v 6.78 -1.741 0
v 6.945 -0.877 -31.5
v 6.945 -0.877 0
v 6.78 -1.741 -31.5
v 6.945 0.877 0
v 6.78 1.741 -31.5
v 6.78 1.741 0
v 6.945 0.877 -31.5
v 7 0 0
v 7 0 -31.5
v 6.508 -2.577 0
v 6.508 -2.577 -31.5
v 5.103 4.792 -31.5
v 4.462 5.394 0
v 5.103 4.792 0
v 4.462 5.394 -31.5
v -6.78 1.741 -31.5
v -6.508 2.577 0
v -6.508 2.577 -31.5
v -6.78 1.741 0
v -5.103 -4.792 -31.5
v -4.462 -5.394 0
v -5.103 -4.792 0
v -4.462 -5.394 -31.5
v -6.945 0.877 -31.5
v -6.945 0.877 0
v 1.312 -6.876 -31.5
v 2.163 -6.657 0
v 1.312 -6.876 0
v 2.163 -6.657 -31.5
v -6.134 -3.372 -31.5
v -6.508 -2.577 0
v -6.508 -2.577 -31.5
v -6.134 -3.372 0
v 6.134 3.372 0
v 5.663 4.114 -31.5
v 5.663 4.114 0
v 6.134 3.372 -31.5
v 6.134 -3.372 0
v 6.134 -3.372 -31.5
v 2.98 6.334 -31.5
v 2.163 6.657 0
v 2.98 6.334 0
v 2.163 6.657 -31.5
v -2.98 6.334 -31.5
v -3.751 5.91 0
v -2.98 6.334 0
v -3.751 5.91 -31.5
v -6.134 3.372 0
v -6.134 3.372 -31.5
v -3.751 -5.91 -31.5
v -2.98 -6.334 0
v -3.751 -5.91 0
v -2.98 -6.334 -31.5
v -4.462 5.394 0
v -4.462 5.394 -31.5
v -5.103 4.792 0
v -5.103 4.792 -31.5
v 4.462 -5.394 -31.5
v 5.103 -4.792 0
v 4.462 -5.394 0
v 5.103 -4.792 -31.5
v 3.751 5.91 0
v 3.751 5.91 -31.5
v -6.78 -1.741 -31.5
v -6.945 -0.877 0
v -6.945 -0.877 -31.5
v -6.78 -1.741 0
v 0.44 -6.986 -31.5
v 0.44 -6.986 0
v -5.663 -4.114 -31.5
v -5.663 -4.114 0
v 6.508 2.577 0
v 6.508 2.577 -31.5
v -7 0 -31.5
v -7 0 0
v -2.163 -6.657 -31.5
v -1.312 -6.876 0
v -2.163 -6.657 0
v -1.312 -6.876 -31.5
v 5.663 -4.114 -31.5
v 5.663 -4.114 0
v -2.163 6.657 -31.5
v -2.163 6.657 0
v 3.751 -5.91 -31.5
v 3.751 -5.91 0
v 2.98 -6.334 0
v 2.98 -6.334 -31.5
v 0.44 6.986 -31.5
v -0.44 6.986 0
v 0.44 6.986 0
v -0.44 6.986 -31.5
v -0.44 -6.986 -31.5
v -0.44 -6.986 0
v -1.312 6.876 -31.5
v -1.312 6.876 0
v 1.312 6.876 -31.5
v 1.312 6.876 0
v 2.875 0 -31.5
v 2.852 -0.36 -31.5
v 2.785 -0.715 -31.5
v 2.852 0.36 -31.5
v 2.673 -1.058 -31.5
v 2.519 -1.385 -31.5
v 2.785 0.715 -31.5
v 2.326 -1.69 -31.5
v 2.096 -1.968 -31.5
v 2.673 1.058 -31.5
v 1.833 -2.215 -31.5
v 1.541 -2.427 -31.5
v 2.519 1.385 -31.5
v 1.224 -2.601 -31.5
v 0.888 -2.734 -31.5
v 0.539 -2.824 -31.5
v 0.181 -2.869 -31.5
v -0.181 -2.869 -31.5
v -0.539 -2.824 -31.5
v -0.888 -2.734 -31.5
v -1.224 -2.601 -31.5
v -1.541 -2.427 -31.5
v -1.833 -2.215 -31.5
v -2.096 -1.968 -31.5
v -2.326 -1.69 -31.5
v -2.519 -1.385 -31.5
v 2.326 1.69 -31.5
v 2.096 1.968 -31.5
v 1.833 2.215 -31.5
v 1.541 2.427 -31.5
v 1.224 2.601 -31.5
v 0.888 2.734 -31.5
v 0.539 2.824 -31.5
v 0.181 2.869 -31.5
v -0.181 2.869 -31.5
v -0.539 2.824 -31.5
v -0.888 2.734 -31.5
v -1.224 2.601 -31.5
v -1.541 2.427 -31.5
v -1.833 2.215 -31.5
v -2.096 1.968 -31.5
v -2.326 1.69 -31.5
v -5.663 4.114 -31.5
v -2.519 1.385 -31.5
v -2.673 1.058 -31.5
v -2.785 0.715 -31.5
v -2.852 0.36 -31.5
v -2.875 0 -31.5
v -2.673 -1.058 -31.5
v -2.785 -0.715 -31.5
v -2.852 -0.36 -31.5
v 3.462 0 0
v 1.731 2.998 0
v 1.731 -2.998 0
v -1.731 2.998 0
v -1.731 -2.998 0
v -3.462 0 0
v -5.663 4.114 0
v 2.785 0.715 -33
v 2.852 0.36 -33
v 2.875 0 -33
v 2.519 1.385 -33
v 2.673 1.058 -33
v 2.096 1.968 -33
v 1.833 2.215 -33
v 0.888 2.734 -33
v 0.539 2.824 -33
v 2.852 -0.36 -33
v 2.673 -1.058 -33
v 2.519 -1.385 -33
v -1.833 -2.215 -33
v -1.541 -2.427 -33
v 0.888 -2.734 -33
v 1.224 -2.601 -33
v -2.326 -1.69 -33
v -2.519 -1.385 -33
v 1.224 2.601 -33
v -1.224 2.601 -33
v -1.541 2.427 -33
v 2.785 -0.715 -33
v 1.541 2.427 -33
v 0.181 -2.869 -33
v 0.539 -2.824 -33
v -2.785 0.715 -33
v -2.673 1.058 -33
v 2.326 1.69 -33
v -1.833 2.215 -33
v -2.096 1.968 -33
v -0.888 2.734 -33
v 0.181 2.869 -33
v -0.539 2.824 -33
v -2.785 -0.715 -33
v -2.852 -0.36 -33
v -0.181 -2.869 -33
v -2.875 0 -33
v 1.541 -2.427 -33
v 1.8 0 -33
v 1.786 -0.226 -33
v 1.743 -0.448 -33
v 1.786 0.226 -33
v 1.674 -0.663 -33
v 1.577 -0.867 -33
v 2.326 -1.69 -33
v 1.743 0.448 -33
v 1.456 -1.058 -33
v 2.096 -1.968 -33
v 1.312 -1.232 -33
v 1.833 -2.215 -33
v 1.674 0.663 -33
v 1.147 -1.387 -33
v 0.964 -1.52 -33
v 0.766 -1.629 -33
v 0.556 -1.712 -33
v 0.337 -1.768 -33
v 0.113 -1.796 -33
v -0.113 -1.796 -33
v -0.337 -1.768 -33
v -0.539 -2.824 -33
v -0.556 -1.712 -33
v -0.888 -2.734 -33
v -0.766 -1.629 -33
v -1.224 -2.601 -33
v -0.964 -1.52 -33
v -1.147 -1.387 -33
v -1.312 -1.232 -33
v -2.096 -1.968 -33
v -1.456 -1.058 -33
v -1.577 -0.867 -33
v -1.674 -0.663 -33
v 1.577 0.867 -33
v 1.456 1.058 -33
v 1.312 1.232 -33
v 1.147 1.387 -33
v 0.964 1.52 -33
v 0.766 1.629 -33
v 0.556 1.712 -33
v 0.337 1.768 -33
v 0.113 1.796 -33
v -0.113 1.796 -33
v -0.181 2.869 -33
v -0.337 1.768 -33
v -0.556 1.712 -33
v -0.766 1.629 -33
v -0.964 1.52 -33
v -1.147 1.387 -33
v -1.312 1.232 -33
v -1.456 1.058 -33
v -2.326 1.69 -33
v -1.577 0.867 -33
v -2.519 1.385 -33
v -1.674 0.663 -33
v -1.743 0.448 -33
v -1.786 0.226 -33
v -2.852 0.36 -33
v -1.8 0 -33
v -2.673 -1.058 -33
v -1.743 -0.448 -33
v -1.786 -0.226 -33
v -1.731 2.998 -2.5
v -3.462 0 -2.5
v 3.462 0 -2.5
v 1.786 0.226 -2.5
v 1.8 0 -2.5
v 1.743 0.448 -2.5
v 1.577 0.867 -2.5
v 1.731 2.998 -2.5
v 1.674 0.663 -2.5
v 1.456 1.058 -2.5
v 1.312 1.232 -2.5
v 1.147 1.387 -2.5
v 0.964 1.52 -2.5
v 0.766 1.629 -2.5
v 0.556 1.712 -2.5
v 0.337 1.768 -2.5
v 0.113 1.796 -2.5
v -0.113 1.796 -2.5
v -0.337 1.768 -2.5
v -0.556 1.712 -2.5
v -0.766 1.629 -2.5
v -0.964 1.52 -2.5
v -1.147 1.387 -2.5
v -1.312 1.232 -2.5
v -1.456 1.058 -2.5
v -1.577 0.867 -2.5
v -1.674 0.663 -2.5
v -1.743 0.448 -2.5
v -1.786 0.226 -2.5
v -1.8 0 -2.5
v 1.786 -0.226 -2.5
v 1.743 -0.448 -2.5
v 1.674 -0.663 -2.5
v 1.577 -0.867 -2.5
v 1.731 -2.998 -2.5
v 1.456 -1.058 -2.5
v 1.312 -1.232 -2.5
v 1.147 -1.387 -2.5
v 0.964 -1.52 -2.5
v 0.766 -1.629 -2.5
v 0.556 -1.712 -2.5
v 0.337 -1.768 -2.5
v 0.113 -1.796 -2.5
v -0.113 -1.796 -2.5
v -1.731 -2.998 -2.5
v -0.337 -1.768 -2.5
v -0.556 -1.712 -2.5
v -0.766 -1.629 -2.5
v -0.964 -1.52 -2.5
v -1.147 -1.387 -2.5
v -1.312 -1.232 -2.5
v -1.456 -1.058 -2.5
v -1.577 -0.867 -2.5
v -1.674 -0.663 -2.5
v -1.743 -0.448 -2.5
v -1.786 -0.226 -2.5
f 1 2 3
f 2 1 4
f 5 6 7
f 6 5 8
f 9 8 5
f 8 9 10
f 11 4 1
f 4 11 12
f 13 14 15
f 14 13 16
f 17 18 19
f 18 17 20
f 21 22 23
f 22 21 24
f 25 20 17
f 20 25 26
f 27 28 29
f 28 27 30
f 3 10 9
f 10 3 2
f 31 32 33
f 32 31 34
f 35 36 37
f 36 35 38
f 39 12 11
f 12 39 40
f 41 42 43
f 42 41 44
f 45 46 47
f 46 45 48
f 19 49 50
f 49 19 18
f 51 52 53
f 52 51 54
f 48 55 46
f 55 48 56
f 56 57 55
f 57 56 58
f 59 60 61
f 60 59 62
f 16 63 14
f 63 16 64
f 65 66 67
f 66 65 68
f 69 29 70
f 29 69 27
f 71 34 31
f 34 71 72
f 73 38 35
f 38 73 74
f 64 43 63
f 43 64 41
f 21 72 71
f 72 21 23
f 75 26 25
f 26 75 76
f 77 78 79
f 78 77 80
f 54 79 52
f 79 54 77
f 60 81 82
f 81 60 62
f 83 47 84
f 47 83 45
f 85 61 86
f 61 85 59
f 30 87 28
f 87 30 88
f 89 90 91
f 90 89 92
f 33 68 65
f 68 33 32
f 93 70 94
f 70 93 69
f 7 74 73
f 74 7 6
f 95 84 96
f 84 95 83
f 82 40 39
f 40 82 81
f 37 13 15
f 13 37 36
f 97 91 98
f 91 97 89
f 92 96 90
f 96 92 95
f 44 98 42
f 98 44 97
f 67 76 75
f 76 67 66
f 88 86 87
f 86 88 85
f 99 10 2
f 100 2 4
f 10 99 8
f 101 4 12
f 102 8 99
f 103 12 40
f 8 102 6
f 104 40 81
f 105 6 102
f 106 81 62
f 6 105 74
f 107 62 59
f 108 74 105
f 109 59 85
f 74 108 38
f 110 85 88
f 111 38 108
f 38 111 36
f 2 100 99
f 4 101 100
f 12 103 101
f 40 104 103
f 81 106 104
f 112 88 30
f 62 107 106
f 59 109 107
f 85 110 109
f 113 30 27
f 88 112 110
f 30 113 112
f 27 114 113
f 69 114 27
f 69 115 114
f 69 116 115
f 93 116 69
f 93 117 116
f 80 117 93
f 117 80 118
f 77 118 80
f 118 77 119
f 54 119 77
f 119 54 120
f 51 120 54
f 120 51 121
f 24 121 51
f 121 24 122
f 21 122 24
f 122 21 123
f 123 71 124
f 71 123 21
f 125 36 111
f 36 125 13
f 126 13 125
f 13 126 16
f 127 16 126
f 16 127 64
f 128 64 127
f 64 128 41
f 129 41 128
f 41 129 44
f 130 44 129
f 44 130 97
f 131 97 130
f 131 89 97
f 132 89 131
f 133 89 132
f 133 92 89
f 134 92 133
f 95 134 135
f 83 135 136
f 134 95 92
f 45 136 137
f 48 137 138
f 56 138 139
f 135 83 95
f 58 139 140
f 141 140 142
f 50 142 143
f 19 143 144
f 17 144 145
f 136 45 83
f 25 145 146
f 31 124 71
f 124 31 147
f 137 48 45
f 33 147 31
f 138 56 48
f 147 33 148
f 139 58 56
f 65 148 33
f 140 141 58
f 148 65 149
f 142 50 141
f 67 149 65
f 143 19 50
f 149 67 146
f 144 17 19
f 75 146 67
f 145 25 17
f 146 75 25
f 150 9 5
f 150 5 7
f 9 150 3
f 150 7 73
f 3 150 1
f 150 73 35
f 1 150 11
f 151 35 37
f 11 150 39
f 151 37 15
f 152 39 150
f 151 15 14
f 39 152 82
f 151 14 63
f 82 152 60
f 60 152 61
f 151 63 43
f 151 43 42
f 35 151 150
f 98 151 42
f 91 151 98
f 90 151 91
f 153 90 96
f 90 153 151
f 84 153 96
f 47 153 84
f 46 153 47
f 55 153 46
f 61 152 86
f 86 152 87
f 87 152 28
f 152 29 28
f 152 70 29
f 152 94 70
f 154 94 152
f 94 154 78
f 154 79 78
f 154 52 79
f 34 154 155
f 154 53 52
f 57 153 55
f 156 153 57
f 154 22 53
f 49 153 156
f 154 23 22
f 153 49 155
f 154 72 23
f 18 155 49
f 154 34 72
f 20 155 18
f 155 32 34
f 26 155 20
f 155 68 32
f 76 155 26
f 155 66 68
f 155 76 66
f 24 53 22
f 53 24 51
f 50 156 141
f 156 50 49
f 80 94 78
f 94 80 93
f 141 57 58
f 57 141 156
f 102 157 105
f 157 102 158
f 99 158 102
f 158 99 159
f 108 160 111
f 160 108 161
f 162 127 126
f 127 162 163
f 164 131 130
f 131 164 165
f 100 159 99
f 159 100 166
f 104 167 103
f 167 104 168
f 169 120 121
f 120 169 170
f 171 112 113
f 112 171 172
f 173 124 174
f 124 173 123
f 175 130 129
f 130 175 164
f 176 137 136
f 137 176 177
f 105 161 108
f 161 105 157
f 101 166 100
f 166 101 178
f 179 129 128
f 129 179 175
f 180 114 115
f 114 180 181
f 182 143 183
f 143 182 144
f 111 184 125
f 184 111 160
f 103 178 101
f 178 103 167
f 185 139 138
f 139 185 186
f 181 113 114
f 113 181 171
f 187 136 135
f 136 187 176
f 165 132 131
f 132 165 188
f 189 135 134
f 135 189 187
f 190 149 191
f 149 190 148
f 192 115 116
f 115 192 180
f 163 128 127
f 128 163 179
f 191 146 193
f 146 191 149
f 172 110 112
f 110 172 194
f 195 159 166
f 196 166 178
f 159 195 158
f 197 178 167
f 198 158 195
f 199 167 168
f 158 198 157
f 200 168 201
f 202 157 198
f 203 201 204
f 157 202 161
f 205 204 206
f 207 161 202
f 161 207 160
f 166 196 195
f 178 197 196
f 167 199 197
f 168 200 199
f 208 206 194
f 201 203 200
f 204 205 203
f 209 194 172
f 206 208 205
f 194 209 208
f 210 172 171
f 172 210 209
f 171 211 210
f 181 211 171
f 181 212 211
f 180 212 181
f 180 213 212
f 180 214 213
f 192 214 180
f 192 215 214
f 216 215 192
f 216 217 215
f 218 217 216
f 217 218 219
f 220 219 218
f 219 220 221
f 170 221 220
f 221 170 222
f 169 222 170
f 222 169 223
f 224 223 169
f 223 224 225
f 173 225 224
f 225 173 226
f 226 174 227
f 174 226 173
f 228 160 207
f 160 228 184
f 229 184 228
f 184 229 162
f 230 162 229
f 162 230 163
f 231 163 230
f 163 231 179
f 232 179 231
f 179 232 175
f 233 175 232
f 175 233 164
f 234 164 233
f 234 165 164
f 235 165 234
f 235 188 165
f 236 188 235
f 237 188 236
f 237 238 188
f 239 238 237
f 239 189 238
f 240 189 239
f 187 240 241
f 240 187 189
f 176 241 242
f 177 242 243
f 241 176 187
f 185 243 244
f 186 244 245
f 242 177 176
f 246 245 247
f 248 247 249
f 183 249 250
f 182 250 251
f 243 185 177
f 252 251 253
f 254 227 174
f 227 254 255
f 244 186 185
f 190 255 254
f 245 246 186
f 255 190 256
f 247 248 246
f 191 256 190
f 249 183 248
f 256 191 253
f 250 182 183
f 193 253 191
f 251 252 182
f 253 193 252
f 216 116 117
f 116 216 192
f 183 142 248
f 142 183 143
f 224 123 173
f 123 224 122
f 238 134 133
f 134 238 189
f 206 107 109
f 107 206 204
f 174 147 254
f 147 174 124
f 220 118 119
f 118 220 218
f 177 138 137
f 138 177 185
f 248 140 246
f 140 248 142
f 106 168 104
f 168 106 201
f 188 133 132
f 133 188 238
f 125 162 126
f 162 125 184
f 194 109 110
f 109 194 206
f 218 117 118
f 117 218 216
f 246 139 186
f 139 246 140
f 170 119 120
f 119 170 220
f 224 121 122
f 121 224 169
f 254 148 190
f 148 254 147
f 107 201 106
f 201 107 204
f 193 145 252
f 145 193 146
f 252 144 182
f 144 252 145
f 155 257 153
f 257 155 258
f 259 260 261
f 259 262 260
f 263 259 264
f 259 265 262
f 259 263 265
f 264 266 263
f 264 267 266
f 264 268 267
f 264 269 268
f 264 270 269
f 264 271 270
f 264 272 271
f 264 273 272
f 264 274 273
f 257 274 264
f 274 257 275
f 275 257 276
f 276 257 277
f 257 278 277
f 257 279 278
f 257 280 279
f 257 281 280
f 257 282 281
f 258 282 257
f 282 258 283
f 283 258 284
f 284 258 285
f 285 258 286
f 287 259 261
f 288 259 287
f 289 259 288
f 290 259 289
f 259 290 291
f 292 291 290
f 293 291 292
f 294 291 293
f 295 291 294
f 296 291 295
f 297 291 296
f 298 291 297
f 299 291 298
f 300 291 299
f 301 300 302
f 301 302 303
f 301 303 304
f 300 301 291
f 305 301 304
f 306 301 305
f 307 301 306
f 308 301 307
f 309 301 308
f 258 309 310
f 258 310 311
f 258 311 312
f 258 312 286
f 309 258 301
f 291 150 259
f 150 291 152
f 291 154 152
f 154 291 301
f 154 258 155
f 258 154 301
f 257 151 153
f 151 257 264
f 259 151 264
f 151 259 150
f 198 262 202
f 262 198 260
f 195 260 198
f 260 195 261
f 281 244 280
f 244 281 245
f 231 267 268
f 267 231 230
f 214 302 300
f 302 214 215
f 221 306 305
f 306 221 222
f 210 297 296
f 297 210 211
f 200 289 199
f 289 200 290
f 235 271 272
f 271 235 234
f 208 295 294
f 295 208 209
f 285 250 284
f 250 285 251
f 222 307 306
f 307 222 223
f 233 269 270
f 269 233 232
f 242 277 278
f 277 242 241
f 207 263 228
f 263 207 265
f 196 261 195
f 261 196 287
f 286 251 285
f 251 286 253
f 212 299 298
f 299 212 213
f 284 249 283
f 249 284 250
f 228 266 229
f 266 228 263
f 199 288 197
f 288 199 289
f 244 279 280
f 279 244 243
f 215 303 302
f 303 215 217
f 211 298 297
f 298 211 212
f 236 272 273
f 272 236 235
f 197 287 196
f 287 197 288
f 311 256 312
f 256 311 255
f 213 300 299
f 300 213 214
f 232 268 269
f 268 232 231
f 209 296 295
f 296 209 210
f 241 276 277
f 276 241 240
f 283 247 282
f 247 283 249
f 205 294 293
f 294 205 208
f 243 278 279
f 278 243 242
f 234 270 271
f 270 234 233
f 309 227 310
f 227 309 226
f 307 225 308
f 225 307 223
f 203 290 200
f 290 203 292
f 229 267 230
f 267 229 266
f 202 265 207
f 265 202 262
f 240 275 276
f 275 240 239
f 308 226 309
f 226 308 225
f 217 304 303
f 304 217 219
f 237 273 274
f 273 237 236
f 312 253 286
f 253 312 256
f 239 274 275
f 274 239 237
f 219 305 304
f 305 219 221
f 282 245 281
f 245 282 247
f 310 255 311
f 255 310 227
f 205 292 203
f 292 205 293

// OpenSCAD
$fn = 50;

difference() {
	union() {
		translate(v = [0, 0, -31.5]) {
			cylinder(h = 31.5, r = 7.0);
		}
		#translate(v = [0, 0, -33.0]) {
			cylinder(h = 33, r = 2.875);
		}
	}
	union() {
		translate(v = [0, 0, 0]) {
			rotate(a = [0, 0, 0]) {
				difference() {
					union() {
						translate(v = [0, 0, -2.5]) {
							linear_extrude(height = 2.5) {
								polygon(points = [[3.4619999999999997, 0.0], [1.7310000000000003, 2.9981799479017264], [-1.7309999999999992, 2.9981799479017264], [-3.4619999999999997, 4.2397272186481365e-16], [-1.7310000000000014, -2.998179947901726], [1.7309999999999977, -2.9981799479017277]]);
							}
						}
					}
					union();
				}
			}
		}
		#translate(v = [0, 0, -100.0]) {
			cylinder(h = 200, r = 1.8);
		}
	}
}
